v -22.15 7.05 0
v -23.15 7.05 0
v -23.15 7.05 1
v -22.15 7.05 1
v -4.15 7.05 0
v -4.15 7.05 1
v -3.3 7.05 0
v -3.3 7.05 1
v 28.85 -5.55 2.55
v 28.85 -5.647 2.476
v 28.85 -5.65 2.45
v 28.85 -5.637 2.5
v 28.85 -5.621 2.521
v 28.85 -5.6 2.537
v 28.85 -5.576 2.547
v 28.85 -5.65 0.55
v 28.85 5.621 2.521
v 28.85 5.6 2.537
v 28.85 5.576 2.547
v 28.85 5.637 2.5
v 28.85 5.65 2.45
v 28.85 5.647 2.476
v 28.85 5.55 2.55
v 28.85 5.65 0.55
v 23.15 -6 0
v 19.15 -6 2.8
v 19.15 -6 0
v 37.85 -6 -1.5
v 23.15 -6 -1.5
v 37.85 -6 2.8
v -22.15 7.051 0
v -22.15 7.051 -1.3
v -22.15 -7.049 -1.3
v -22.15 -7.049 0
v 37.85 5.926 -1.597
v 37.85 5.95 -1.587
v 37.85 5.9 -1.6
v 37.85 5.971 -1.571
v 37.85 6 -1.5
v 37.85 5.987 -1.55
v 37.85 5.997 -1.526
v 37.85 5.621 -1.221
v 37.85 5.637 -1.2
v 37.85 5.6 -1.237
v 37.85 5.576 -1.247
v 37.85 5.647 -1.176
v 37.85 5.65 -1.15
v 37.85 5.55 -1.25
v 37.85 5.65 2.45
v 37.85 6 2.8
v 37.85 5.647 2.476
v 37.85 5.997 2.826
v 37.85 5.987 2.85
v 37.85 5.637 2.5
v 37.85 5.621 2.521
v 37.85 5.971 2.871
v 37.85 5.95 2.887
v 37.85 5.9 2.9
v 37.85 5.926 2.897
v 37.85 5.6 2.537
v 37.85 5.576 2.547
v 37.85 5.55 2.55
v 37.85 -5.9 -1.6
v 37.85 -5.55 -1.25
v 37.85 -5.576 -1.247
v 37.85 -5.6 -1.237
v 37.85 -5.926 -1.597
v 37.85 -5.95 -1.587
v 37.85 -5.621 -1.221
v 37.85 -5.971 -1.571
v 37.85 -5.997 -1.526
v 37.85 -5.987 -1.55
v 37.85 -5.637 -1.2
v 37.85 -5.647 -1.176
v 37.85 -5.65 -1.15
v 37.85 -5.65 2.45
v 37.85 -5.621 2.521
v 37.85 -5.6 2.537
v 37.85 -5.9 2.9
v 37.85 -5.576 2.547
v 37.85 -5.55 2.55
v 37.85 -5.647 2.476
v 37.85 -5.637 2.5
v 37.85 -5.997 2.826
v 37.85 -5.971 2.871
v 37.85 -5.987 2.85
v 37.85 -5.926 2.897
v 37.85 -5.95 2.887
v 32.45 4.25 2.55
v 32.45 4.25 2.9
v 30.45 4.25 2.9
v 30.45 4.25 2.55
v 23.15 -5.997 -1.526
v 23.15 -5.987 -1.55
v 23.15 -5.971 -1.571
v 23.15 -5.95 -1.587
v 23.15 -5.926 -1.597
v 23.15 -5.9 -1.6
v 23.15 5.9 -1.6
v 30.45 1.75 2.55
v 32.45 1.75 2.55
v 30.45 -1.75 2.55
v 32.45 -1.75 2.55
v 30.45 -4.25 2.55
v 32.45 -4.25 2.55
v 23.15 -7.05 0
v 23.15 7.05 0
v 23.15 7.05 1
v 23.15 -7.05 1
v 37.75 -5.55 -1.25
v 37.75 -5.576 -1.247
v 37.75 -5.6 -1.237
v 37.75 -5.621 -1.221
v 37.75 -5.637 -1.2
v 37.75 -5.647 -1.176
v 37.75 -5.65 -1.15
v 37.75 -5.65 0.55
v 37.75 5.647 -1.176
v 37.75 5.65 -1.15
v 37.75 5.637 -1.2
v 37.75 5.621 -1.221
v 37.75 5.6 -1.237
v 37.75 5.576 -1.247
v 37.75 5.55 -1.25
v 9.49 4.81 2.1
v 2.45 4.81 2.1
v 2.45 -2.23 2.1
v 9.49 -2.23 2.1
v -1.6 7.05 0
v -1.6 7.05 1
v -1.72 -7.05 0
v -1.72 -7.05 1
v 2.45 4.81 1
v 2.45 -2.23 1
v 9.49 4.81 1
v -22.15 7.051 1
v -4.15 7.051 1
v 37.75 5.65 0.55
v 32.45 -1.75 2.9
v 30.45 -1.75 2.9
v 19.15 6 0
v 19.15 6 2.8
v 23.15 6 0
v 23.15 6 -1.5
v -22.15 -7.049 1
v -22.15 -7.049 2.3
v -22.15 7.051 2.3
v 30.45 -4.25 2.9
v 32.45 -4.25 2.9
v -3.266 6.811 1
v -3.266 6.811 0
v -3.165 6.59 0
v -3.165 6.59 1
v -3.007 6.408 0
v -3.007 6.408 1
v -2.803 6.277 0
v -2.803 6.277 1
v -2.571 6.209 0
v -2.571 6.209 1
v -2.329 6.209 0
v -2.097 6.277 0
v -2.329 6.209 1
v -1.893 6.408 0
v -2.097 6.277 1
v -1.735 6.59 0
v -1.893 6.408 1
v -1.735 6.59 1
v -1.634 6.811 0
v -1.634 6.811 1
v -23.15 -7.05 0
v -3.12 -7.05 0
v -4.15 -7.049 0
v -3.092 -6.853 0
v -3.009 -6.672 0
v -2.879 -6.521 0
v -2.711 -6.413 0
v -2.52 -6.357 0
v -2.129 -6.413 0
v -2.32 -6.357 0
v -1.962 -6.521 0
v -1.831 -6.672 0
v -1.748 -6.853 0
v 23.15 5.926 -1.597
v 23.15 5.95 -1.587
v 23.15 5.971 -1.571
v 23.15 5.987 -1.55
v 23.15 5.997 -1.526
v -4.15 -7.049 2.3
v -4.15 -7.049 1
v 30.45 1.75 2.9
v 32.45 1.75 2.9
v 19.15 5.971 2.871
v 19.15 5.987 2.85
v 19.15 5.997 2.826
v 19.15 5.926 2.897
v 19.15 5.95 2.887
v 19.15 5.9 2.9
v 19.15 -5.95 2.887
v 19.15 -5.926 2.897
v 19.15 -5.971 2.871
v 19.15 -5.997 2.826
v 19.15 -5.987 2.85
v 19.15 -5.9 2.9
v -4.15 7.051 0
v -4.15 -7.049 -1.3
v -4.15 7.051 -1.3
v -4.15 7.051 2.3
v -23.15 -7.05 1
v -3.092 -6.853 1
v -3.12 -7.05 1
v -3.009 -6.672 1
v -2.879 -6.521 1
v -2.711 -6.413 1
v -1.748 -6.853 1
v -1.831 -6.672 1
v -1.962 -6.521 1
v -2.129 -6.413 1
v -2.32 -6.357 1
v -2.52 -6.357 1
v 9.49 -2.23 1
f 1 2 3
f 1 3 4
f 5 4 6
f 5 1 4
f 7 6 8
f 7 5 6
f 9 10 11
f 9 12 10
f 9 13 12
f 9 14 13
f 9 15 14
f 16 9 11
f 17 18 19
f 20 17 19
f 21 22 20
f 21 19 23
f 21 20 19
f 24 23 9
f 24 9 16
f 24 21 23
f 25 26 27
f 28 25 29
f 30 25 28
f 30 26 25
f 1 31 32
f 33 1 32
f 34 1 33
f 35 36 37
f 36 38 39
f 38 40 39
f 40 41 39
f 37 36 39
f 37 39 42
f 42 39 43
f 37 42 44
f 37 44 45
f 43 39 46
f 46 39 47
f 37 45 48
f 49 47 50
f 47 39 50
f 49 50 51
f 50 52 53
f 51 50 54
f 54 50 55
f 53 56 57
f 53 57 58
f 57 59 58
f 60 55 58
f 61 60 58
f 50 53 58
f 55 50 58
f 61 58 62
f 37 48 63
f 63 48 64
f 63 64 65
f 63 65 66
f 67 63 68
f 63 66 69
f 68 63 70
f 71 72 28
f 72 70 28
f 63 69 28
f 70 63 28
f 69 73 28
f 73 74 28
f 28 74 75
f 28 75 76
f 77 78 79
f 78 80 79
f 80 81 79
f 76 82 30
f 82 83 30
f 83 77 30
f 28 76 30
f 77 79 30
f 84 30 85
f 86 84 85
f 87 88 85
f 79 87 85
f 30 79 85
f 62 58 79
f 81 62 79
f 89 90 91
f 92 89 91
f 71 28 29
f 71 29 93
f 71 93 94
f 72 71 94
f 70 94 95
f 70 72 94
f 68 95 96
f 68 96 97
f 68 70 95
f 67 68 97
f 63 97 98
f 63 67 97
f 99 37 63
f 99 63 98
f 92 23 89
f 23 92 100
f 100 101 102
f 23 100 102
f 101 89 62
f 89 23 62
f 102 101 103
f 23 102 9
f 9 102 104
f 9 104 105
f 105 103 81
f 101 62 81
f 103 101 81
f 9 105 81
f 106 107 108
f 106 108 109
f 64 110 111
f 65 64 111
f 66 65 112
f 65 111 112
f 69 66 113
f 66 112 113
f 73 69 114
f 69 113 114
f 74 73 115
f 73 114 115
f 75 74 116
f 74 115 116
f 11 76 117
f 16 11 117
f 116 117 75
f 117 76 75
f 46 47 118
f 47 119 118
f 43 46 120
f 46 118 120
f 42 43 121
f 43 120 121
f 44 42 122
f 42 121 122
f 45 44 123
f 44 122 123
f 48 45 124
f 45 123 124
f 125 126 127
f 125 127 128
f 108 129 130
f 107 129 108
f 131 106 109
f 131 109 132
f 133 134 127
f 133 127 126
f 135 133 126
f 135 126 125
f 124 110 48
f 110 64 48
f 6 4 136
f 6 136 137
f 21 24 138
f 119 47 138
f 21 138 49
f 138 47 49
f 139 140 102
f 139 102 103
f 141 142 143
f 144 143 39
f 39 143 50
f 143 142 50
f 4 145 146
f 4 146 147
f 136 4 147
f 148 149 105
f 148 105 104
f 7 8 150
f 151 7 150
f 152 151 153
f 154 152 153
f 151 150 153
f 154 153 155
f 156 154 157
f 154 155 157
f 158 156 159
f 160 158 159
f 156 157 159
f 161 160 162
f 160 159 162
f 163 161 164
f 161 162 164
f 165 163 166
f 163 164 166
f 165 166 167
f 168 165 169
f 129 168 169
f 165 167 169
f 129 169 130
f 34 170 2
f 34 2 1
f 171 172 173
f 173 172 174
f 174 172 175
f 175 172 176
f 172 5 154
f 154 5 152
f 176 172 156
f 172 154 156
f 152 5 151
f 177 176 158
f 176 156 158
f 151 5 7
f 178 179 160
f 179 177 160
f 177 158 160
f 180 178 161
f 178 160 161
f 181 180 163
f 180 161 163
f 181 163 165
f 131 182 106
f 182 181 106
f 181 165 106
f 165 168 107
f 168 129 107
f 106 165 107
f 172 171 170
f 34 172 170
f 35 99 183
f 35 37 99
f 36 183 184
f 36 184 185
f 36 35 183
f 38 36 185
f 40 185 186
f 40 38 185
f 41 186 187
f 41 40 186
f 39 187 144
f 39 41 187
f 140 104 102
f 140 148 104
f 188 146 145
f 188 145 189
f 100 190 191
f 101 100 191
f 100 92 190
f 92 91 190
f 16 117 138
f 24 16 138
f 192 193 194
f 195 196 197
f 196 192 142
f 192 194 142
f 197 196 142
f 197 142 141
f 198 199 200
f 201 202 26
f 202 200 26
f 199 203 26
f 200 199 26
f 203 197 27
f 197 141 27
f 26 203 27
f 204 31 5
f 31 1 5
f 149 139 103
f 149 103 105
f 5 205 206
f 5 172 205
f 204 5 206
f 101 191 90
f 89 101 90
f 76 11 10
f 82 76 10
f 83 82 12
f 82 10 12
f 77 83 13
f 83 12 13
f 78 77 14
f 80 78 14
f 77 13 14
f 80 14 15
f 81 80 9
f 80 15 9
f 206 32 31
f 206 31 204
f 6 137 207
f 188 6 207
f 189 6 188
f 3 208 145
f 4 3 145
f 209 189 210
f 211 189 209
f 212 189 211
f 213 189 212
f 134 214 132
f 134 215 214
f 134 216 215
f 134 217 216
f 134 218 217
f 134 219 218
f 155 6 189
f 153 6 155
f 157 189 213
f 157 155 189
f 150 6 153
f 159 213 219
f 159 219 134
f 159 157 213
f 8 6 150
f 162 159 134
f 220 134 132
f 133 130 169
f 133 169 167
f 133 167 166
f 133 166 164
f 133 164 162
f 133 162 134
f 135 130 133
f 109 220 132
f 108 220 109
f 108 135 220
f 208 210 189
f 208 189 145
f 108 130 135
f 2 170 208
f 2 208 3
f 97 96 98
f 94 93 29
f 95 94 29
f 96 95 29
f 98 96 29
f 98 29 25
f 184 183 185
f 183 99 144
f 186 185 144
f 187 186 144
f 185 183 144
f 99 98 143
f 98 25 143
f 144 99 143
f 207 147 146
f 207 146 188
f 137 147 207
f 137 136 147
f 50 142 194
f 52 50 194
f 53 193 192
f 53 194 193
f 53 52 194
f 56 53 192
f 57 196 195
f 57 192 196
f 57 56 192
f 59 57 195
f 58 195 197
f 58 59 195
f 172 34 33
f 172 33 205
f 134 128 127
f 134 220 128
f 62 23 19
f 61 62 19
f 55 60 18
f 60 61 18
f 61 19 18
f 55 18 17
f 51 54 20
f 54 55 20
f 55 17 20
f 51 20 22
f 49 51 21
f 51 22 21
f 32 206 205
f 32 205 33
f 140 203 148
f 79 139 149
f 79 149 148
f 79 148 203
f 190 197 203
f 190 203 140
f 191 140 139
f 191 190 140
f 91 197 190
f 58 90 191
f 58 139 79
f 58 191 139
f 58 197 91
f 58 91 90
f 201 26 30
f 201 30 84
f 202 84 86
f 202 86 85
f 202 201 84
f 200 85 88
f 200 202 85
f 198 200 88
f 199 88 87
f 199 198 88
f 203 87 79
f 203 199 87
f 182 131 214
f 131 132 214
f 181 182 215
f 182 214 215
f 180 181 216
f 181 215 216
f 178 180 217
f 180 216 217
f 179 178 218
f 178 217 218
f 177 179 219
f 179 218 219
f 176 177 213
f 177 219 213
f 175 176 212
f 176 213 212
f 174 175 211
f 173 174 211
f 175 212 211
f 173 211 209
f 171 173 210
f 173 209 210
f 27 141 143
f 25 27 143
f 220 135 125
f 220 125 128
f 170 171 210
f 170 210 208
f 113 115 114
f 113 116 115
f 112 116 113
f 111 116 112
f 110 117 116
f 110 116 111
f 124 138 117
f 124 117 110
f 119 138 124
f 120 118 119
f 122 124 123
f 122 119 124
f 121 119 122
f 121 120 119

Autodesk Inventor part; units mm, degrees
ref_plane "YZ Plane" through (0, 0, 0) normal (1, 0, 0) x (0, 1, 0)
ref_plane "XZ Plane" through (0, 0, 0) normal (0, 1, 0) x (-1, 0, 0)
ref_plane "XY Plane" through (0, 0, 0) normal (0, 0, 1) x (1, 0, 0)
sketch "Skizze1" plane through (0, 0, 0) normal (0, 0, 1) x (1, 0, 0)
  line L0 (-23.15, 7.05) -> (23.15, 7.05)
  line L1 (23.15, 7.05) -> (23.15, -7.05)
  line L2 (23.15, -7.05) -> (-23.15, -7.05)
  line L3 (-23.15, -7.05) -> (-23.15, 7.05)
  line L4 (-23.15, 7.05) -> (23.15, -7.05) construction
  point P0 (0, 0)
  point P1 (0, 0)
  dimension "d0" = 46.3
  dimension "d1" = 14.1
extrude "Extrusion1" add sketch "Skizze1" along normal blind 1
sketch "Skizze3" plane through (0, 0, 0) normal (0, 0, 1) x (1, 0, 0)
  line L0 (37.85, 6) -> (19.15, 6)
  line L1 (19.15, 6) -> (19.15, -6)
  line L2 (19.15, -6) -> (37.85, -6)
  line L3 (37.85, -6) -> (37.85, 6)
  line L4 (23.15, -7.05) -> (23.15, 7.05) projected
  line L5 (23.15, 0) -> (19.15, 0) construction
  point P0 (0, 0)
  dimension "d8" = 18.7
  dimension "d9" = 12
extrude "Extrusion2" add sketch "Skizze3" along normal blind 2.9 separate body
sketch "Skizze4" plane through (0, 0, 0) normal (0, 0, -1) x (-1, 0, 0)
  line L0 (-19.15, -6) -> (-37.85, -6) projected
  line L1 (-23.15, -7.05) -> (-23.15, 7.05) projected
  line L2 (-37.85, -6) -> (-23.15, -6)
  line L3 (-23.15, -6) -> (-23.15, 6)
  line L4 (-23.15, 6) -> (-37.85, 6)
  line L5 (-37.85, 6) -> (-37.85, -6)
  point P0 (0, 0)
  dimension "d16" = 12
extrude "Extrusion3" add sketch "Skizze4" along normal blind 1.6 bodies 2
sketch "Skizze5" plane through (0, 0, 1) normal (0, 0, 1) x (1, 0, 0)
  line L0 (-23.15, 7.05) -> (-23.15, -7.05) construction
  line L1 (23.15, 7.05) -> (-23.15, 7.05) construction
  line L2 (-22.15, 7.05) -> (-4.15, 7.05)
  line L3 (-4.15, 7.05) -> (-4.15, -7.05)
  line L4 (-4.15, -7.05) -> (-22.15, -7.05)
  line L5 (-22.15, -7.05) -> (-22.15, 7.05)
  point P0 (0, 0)
  dimension "d20" = 18
  dimension "d21" = 14.1
extrude "Extrusion4" add sketch "Skizze5" along normal blind 1.3 bodies 1
sketch "Skizze6" plane through (0, 0, 0) normal (0, 0, -1) x (-1, 0, 0)
  line L0 (23.15, 7.05) -> (23.15, -7.05) construction
  line L1 (23.15, 0) -> (22.15, 0) construction
  line L2 (22.15, 7.05) -> (22.15, -7.05) projected
  line L3 (22.15, -7.05) -> (4.15, -7.05)
  line L4 (4.15, -7.05) -> (4.15, 7.05)
  line L5 (4.15, 7.05) -> (22.15, 7.05)
  line L6 (22.15, 7.05) -> (22.15, -7.05)
  point P0 (0, 0)
  dimension "d24" = 1
  dimension "d25" = 18
  dimension "d26" = 14.1
extrude "Extrusion5" add sketch "Skizze6" along normal blind 1.3 bodies 1
sketch "Skizze8" plane through (37.85, -6, 2.9) normal (1, 0, 0) x (0, 0, -1)
  line L0 (4.5, 12) -> (4.5, 0) projected
  line L1 (0, 0) -> (0, 12) projected
  line L2 (0.35, 0.35) -> (2.35, 0.35)
  line L3 (2.35, 0.35) -> (2.35, 11.65)
  line L4 (2.35, 11.65) -> (0.35, 11.65)
  line L5 (0.35, 11.65) -> (0.35, 0.35)
  line L6 (0, 12) -> (0, 0) construction
  line L7 (0, 6) -> (0.35, 6) construction
  dimension "d42" = 2
  dimension "d43" = 11.3
  dimension "d44" = 0.35
extrude "Extrusion6" cut sketch "Skizze8" against normal blind 9 bodies 2
sketch "Skizze9" plane through (37.85, -6, 2.9) normal (1, 0, 0) x (0, 0, -1)
  line L0 (0, 0) -> (0, 12) projected
  line L1 (4.5, 12) -> (4.5, 0) projected
  line L2 (2.35, 11.65) -> (2.35, 0.35) projected
  line L3 (2.35, 0.35) -> (4.15, 0.35)
  line L4 (4.15, 0.35) -> (4.15, 11.65)
  line L5 (4.15, 11.65) -> (2.35, 11.65)
  line L6 (2.35, 11.65) -> (2.35, 0.35)
  point P0 (2.9, 6)
extrude "Extrusion7" cut sketch "Skizze9" against normal blind 0.1 bodies 2
sketch "Skizze15" plane through (0, 0, 1) normal (0, 0, 1) x (1, 0, 0)
  line L0 (-4.1196, -7.0919) -> (-2.4201, -7.05) construction
  line L1 (-4.15, -7.05) -> (23.15, -7.05) construction
  circle A0 centre (-2.4201, -7.05) radius 0.7
  point P0 (0, 0)
  dimension "d81" = 1.7
  dimension "d82" = 1.4
extrude "Extrusion8" cut sketch "Skizze15" against normal blind 1 bodies 1
sketch "Skizze17" plane through (0, 0, 1) normal (0, 0, 1) x (1, 0, 0)
  line L0 (-4.15, 7.05) -> (-22.15, 7.05) projected
  line L1 (-4.15, 7.05) -> (-2.45, 7.05)
  line L2 (23.15, 7.05) -> (-4.15, 7.05) projected
  circle A0 centre (-2.45, 7.05) radius 0.85
  point P0 (0, 0)
  dimension "d87" = 1.7
  dimension "d88" = 1.7
extrude "Extrusion9" cut sketch "Skizze17" against normal blind 1 bodies 1
sketch "Skizze19" plane through (0, 0, 2.9) normal (0, 0, 1) x (1, 0, 0)
  line L0 (37.85, -6) -> (37.85, 6) projected
  line L1 (32.45, -4.25) -> (30.45, -4.25)
  line L2 (30.45, -4.25) -> (30.45, -1.75)
  line L3 (30.45, -1.75) -> (32.45, -1.75)
  line L4 (32.45, -1.75) -> (32.45, -4.25)
  point P0 (0, 0)
  point P1 (32.45, 4.25)
  dimension "d101" = 2
  dimension "d102" = 2.5
extrude "Extrusion10" cut sketch "Skizze19" against normal up to next bodies 2
sketch "Skizze20" plane through (0, 0, 2.9) normal (0, 0, 1) x (1, 0, 0)
  line L0 (37.85, 5.65) -> (37.85, -5.65) projected
  line L1 (37.85, 0) -> (32.45, 0)
  line L2 (32.45, 0) -> (32.45, 4.25)
  line L3 (32.45, 4.25) -> (30.45, 4.25)
  line L4 (30.45, 4.25) -> (30.45, 1.75)
  line L5 (30.45, 1.75) -> (32.45, 1.75)
  line L6 (32.45, 1.75) -> (32.45, 4.25)
  point P0 (0, 0)
  dimension "d107" = 5.4
  dimension "d108" = 4.25
  dimension "d109" = 2
  dimension "d110" = 2.5
extrude "Extrusion11" cut sketch "Skizze20" against normal up to next bodies 2
fillet "Rundung1" radius 0.1 2 edges at (28.5, -6, 2.9) (28.5, 6, 2.9)
fillet "Rundung3" radius 0.1 1 edges at (30.5, -6, -1.6)
fillet "Rundung4" radius 0.1 1 edges at (30.5, 6, -1.6)
fillet "Rundung5" radius 0.1 1 edges at (37.8, -5.65, -1.25)
fillet "Rundung6" radius 0.1 1 edges at (33.35, -5.65, 2.55)
fillet "Rundung7" radius 0.1 1 edges at (37.8, 5.65, -1.25)
fillet "Rundung8" radius 0.1 1 edges at (33.35, 5.65, 2.55)
sketch "Skizze21" plane through (0, 0, 1) normal (0, 0, 1) x (1, 0, 0)
  line L0 (2.45, 4.81) -> (9.49, 4.81)
  line L1 (9.49, 4.81) -> (9.49, -2.23)
  line L2 (9.49, -2.23) -> (2.45, -2.23)
  line L3 (2.45, -2.23) -> (2.45, 4.81)
  line L4 (19.15, 5.9) -> (19.15, -5.9) construction
  line L5 (-4.15, -7.05) -> (-4.15, 7.05) construction
  line L6 (-4.15, 7.05) -> (2.45, 7.05) construction
  line L7 (2.45, 7.05) -> (2.45, 4.81) construction
  line L8 (2.45, 4.81) -> (-4.15, 4.81) construction
  line L9 (-4.15, 4.81) -> (-4.15, 7.05) construction
  point P0 (0, 0)
  dimension "d121" = 7.04
  dimension "d122" = 7.04
  dimension "d125" = 6.6
  dimension "d126" = 2.24
extrude "Extrusion12" add sketch "Skizze21" along normal blind 1.1 bodies 1
sketch "Skizze22" plane through (-23.15, -7.05, 0) normal (0, -1, 0) x (1, 0, 0)
  line L0 (19, 2.3) -> (1, 2.3) projected
  line L1 (19, 1) -> (20.0299, 1) projected
  line L2 (1, 2.3) -> (19, 2.3)
  line L3 (19, 2.3) -> (19, 1)
  line L4 (19, 1) -> (1, 1)
  line L5 (1, 1) -> (1, 2.3)
  line L6 (1, -1.3) -> (19, -1.3) projected
  line L7 (19, 0) -> (1, 0)
  line L8 (1, 0) -> (1, -1.3)
  line L9 (1, -1.3) -> (19, -1.3)
  line L10 (19, -1.3) -> (19, 0)
  point P0 (23.15, 0)
extrude "Extrusion13" cut sketch "Skizze22" against normal blind 0.001 bodies 1
sketch "Skizze23" plane through (-23.15, 7.05, 1) normal (0, 1, 0) x (1, 0, 0)
  line L0 (19, 0) -> (19, -1.3) projected
  line L1 (19, -1.3) -> (1, -1.3)
  line L2 (1, -1.3) -> (1, 0)
  line L3 (1, 0) -> (19, 0)
  line L4 (19, 0) -> (19, -1.3)
  line L5 (1, 1) -> (1, 2.3) projected
  line L6 (19, 1) -> (19, 2.3) projected
  line L7 (1, 1) -> (19, 1)
  line L8 (19, 1) -> (19, 2.3)
  line L9 (19, 2.3) -> (1, 2.3)
  line L10 (1, 2.3) -> (1, 1)
  point P0 (23.15, 1)
extrude "Extrusion14" add sketch "Skizze23" along normal blind 0.001 bodies 1
properties part number "USB stick"
